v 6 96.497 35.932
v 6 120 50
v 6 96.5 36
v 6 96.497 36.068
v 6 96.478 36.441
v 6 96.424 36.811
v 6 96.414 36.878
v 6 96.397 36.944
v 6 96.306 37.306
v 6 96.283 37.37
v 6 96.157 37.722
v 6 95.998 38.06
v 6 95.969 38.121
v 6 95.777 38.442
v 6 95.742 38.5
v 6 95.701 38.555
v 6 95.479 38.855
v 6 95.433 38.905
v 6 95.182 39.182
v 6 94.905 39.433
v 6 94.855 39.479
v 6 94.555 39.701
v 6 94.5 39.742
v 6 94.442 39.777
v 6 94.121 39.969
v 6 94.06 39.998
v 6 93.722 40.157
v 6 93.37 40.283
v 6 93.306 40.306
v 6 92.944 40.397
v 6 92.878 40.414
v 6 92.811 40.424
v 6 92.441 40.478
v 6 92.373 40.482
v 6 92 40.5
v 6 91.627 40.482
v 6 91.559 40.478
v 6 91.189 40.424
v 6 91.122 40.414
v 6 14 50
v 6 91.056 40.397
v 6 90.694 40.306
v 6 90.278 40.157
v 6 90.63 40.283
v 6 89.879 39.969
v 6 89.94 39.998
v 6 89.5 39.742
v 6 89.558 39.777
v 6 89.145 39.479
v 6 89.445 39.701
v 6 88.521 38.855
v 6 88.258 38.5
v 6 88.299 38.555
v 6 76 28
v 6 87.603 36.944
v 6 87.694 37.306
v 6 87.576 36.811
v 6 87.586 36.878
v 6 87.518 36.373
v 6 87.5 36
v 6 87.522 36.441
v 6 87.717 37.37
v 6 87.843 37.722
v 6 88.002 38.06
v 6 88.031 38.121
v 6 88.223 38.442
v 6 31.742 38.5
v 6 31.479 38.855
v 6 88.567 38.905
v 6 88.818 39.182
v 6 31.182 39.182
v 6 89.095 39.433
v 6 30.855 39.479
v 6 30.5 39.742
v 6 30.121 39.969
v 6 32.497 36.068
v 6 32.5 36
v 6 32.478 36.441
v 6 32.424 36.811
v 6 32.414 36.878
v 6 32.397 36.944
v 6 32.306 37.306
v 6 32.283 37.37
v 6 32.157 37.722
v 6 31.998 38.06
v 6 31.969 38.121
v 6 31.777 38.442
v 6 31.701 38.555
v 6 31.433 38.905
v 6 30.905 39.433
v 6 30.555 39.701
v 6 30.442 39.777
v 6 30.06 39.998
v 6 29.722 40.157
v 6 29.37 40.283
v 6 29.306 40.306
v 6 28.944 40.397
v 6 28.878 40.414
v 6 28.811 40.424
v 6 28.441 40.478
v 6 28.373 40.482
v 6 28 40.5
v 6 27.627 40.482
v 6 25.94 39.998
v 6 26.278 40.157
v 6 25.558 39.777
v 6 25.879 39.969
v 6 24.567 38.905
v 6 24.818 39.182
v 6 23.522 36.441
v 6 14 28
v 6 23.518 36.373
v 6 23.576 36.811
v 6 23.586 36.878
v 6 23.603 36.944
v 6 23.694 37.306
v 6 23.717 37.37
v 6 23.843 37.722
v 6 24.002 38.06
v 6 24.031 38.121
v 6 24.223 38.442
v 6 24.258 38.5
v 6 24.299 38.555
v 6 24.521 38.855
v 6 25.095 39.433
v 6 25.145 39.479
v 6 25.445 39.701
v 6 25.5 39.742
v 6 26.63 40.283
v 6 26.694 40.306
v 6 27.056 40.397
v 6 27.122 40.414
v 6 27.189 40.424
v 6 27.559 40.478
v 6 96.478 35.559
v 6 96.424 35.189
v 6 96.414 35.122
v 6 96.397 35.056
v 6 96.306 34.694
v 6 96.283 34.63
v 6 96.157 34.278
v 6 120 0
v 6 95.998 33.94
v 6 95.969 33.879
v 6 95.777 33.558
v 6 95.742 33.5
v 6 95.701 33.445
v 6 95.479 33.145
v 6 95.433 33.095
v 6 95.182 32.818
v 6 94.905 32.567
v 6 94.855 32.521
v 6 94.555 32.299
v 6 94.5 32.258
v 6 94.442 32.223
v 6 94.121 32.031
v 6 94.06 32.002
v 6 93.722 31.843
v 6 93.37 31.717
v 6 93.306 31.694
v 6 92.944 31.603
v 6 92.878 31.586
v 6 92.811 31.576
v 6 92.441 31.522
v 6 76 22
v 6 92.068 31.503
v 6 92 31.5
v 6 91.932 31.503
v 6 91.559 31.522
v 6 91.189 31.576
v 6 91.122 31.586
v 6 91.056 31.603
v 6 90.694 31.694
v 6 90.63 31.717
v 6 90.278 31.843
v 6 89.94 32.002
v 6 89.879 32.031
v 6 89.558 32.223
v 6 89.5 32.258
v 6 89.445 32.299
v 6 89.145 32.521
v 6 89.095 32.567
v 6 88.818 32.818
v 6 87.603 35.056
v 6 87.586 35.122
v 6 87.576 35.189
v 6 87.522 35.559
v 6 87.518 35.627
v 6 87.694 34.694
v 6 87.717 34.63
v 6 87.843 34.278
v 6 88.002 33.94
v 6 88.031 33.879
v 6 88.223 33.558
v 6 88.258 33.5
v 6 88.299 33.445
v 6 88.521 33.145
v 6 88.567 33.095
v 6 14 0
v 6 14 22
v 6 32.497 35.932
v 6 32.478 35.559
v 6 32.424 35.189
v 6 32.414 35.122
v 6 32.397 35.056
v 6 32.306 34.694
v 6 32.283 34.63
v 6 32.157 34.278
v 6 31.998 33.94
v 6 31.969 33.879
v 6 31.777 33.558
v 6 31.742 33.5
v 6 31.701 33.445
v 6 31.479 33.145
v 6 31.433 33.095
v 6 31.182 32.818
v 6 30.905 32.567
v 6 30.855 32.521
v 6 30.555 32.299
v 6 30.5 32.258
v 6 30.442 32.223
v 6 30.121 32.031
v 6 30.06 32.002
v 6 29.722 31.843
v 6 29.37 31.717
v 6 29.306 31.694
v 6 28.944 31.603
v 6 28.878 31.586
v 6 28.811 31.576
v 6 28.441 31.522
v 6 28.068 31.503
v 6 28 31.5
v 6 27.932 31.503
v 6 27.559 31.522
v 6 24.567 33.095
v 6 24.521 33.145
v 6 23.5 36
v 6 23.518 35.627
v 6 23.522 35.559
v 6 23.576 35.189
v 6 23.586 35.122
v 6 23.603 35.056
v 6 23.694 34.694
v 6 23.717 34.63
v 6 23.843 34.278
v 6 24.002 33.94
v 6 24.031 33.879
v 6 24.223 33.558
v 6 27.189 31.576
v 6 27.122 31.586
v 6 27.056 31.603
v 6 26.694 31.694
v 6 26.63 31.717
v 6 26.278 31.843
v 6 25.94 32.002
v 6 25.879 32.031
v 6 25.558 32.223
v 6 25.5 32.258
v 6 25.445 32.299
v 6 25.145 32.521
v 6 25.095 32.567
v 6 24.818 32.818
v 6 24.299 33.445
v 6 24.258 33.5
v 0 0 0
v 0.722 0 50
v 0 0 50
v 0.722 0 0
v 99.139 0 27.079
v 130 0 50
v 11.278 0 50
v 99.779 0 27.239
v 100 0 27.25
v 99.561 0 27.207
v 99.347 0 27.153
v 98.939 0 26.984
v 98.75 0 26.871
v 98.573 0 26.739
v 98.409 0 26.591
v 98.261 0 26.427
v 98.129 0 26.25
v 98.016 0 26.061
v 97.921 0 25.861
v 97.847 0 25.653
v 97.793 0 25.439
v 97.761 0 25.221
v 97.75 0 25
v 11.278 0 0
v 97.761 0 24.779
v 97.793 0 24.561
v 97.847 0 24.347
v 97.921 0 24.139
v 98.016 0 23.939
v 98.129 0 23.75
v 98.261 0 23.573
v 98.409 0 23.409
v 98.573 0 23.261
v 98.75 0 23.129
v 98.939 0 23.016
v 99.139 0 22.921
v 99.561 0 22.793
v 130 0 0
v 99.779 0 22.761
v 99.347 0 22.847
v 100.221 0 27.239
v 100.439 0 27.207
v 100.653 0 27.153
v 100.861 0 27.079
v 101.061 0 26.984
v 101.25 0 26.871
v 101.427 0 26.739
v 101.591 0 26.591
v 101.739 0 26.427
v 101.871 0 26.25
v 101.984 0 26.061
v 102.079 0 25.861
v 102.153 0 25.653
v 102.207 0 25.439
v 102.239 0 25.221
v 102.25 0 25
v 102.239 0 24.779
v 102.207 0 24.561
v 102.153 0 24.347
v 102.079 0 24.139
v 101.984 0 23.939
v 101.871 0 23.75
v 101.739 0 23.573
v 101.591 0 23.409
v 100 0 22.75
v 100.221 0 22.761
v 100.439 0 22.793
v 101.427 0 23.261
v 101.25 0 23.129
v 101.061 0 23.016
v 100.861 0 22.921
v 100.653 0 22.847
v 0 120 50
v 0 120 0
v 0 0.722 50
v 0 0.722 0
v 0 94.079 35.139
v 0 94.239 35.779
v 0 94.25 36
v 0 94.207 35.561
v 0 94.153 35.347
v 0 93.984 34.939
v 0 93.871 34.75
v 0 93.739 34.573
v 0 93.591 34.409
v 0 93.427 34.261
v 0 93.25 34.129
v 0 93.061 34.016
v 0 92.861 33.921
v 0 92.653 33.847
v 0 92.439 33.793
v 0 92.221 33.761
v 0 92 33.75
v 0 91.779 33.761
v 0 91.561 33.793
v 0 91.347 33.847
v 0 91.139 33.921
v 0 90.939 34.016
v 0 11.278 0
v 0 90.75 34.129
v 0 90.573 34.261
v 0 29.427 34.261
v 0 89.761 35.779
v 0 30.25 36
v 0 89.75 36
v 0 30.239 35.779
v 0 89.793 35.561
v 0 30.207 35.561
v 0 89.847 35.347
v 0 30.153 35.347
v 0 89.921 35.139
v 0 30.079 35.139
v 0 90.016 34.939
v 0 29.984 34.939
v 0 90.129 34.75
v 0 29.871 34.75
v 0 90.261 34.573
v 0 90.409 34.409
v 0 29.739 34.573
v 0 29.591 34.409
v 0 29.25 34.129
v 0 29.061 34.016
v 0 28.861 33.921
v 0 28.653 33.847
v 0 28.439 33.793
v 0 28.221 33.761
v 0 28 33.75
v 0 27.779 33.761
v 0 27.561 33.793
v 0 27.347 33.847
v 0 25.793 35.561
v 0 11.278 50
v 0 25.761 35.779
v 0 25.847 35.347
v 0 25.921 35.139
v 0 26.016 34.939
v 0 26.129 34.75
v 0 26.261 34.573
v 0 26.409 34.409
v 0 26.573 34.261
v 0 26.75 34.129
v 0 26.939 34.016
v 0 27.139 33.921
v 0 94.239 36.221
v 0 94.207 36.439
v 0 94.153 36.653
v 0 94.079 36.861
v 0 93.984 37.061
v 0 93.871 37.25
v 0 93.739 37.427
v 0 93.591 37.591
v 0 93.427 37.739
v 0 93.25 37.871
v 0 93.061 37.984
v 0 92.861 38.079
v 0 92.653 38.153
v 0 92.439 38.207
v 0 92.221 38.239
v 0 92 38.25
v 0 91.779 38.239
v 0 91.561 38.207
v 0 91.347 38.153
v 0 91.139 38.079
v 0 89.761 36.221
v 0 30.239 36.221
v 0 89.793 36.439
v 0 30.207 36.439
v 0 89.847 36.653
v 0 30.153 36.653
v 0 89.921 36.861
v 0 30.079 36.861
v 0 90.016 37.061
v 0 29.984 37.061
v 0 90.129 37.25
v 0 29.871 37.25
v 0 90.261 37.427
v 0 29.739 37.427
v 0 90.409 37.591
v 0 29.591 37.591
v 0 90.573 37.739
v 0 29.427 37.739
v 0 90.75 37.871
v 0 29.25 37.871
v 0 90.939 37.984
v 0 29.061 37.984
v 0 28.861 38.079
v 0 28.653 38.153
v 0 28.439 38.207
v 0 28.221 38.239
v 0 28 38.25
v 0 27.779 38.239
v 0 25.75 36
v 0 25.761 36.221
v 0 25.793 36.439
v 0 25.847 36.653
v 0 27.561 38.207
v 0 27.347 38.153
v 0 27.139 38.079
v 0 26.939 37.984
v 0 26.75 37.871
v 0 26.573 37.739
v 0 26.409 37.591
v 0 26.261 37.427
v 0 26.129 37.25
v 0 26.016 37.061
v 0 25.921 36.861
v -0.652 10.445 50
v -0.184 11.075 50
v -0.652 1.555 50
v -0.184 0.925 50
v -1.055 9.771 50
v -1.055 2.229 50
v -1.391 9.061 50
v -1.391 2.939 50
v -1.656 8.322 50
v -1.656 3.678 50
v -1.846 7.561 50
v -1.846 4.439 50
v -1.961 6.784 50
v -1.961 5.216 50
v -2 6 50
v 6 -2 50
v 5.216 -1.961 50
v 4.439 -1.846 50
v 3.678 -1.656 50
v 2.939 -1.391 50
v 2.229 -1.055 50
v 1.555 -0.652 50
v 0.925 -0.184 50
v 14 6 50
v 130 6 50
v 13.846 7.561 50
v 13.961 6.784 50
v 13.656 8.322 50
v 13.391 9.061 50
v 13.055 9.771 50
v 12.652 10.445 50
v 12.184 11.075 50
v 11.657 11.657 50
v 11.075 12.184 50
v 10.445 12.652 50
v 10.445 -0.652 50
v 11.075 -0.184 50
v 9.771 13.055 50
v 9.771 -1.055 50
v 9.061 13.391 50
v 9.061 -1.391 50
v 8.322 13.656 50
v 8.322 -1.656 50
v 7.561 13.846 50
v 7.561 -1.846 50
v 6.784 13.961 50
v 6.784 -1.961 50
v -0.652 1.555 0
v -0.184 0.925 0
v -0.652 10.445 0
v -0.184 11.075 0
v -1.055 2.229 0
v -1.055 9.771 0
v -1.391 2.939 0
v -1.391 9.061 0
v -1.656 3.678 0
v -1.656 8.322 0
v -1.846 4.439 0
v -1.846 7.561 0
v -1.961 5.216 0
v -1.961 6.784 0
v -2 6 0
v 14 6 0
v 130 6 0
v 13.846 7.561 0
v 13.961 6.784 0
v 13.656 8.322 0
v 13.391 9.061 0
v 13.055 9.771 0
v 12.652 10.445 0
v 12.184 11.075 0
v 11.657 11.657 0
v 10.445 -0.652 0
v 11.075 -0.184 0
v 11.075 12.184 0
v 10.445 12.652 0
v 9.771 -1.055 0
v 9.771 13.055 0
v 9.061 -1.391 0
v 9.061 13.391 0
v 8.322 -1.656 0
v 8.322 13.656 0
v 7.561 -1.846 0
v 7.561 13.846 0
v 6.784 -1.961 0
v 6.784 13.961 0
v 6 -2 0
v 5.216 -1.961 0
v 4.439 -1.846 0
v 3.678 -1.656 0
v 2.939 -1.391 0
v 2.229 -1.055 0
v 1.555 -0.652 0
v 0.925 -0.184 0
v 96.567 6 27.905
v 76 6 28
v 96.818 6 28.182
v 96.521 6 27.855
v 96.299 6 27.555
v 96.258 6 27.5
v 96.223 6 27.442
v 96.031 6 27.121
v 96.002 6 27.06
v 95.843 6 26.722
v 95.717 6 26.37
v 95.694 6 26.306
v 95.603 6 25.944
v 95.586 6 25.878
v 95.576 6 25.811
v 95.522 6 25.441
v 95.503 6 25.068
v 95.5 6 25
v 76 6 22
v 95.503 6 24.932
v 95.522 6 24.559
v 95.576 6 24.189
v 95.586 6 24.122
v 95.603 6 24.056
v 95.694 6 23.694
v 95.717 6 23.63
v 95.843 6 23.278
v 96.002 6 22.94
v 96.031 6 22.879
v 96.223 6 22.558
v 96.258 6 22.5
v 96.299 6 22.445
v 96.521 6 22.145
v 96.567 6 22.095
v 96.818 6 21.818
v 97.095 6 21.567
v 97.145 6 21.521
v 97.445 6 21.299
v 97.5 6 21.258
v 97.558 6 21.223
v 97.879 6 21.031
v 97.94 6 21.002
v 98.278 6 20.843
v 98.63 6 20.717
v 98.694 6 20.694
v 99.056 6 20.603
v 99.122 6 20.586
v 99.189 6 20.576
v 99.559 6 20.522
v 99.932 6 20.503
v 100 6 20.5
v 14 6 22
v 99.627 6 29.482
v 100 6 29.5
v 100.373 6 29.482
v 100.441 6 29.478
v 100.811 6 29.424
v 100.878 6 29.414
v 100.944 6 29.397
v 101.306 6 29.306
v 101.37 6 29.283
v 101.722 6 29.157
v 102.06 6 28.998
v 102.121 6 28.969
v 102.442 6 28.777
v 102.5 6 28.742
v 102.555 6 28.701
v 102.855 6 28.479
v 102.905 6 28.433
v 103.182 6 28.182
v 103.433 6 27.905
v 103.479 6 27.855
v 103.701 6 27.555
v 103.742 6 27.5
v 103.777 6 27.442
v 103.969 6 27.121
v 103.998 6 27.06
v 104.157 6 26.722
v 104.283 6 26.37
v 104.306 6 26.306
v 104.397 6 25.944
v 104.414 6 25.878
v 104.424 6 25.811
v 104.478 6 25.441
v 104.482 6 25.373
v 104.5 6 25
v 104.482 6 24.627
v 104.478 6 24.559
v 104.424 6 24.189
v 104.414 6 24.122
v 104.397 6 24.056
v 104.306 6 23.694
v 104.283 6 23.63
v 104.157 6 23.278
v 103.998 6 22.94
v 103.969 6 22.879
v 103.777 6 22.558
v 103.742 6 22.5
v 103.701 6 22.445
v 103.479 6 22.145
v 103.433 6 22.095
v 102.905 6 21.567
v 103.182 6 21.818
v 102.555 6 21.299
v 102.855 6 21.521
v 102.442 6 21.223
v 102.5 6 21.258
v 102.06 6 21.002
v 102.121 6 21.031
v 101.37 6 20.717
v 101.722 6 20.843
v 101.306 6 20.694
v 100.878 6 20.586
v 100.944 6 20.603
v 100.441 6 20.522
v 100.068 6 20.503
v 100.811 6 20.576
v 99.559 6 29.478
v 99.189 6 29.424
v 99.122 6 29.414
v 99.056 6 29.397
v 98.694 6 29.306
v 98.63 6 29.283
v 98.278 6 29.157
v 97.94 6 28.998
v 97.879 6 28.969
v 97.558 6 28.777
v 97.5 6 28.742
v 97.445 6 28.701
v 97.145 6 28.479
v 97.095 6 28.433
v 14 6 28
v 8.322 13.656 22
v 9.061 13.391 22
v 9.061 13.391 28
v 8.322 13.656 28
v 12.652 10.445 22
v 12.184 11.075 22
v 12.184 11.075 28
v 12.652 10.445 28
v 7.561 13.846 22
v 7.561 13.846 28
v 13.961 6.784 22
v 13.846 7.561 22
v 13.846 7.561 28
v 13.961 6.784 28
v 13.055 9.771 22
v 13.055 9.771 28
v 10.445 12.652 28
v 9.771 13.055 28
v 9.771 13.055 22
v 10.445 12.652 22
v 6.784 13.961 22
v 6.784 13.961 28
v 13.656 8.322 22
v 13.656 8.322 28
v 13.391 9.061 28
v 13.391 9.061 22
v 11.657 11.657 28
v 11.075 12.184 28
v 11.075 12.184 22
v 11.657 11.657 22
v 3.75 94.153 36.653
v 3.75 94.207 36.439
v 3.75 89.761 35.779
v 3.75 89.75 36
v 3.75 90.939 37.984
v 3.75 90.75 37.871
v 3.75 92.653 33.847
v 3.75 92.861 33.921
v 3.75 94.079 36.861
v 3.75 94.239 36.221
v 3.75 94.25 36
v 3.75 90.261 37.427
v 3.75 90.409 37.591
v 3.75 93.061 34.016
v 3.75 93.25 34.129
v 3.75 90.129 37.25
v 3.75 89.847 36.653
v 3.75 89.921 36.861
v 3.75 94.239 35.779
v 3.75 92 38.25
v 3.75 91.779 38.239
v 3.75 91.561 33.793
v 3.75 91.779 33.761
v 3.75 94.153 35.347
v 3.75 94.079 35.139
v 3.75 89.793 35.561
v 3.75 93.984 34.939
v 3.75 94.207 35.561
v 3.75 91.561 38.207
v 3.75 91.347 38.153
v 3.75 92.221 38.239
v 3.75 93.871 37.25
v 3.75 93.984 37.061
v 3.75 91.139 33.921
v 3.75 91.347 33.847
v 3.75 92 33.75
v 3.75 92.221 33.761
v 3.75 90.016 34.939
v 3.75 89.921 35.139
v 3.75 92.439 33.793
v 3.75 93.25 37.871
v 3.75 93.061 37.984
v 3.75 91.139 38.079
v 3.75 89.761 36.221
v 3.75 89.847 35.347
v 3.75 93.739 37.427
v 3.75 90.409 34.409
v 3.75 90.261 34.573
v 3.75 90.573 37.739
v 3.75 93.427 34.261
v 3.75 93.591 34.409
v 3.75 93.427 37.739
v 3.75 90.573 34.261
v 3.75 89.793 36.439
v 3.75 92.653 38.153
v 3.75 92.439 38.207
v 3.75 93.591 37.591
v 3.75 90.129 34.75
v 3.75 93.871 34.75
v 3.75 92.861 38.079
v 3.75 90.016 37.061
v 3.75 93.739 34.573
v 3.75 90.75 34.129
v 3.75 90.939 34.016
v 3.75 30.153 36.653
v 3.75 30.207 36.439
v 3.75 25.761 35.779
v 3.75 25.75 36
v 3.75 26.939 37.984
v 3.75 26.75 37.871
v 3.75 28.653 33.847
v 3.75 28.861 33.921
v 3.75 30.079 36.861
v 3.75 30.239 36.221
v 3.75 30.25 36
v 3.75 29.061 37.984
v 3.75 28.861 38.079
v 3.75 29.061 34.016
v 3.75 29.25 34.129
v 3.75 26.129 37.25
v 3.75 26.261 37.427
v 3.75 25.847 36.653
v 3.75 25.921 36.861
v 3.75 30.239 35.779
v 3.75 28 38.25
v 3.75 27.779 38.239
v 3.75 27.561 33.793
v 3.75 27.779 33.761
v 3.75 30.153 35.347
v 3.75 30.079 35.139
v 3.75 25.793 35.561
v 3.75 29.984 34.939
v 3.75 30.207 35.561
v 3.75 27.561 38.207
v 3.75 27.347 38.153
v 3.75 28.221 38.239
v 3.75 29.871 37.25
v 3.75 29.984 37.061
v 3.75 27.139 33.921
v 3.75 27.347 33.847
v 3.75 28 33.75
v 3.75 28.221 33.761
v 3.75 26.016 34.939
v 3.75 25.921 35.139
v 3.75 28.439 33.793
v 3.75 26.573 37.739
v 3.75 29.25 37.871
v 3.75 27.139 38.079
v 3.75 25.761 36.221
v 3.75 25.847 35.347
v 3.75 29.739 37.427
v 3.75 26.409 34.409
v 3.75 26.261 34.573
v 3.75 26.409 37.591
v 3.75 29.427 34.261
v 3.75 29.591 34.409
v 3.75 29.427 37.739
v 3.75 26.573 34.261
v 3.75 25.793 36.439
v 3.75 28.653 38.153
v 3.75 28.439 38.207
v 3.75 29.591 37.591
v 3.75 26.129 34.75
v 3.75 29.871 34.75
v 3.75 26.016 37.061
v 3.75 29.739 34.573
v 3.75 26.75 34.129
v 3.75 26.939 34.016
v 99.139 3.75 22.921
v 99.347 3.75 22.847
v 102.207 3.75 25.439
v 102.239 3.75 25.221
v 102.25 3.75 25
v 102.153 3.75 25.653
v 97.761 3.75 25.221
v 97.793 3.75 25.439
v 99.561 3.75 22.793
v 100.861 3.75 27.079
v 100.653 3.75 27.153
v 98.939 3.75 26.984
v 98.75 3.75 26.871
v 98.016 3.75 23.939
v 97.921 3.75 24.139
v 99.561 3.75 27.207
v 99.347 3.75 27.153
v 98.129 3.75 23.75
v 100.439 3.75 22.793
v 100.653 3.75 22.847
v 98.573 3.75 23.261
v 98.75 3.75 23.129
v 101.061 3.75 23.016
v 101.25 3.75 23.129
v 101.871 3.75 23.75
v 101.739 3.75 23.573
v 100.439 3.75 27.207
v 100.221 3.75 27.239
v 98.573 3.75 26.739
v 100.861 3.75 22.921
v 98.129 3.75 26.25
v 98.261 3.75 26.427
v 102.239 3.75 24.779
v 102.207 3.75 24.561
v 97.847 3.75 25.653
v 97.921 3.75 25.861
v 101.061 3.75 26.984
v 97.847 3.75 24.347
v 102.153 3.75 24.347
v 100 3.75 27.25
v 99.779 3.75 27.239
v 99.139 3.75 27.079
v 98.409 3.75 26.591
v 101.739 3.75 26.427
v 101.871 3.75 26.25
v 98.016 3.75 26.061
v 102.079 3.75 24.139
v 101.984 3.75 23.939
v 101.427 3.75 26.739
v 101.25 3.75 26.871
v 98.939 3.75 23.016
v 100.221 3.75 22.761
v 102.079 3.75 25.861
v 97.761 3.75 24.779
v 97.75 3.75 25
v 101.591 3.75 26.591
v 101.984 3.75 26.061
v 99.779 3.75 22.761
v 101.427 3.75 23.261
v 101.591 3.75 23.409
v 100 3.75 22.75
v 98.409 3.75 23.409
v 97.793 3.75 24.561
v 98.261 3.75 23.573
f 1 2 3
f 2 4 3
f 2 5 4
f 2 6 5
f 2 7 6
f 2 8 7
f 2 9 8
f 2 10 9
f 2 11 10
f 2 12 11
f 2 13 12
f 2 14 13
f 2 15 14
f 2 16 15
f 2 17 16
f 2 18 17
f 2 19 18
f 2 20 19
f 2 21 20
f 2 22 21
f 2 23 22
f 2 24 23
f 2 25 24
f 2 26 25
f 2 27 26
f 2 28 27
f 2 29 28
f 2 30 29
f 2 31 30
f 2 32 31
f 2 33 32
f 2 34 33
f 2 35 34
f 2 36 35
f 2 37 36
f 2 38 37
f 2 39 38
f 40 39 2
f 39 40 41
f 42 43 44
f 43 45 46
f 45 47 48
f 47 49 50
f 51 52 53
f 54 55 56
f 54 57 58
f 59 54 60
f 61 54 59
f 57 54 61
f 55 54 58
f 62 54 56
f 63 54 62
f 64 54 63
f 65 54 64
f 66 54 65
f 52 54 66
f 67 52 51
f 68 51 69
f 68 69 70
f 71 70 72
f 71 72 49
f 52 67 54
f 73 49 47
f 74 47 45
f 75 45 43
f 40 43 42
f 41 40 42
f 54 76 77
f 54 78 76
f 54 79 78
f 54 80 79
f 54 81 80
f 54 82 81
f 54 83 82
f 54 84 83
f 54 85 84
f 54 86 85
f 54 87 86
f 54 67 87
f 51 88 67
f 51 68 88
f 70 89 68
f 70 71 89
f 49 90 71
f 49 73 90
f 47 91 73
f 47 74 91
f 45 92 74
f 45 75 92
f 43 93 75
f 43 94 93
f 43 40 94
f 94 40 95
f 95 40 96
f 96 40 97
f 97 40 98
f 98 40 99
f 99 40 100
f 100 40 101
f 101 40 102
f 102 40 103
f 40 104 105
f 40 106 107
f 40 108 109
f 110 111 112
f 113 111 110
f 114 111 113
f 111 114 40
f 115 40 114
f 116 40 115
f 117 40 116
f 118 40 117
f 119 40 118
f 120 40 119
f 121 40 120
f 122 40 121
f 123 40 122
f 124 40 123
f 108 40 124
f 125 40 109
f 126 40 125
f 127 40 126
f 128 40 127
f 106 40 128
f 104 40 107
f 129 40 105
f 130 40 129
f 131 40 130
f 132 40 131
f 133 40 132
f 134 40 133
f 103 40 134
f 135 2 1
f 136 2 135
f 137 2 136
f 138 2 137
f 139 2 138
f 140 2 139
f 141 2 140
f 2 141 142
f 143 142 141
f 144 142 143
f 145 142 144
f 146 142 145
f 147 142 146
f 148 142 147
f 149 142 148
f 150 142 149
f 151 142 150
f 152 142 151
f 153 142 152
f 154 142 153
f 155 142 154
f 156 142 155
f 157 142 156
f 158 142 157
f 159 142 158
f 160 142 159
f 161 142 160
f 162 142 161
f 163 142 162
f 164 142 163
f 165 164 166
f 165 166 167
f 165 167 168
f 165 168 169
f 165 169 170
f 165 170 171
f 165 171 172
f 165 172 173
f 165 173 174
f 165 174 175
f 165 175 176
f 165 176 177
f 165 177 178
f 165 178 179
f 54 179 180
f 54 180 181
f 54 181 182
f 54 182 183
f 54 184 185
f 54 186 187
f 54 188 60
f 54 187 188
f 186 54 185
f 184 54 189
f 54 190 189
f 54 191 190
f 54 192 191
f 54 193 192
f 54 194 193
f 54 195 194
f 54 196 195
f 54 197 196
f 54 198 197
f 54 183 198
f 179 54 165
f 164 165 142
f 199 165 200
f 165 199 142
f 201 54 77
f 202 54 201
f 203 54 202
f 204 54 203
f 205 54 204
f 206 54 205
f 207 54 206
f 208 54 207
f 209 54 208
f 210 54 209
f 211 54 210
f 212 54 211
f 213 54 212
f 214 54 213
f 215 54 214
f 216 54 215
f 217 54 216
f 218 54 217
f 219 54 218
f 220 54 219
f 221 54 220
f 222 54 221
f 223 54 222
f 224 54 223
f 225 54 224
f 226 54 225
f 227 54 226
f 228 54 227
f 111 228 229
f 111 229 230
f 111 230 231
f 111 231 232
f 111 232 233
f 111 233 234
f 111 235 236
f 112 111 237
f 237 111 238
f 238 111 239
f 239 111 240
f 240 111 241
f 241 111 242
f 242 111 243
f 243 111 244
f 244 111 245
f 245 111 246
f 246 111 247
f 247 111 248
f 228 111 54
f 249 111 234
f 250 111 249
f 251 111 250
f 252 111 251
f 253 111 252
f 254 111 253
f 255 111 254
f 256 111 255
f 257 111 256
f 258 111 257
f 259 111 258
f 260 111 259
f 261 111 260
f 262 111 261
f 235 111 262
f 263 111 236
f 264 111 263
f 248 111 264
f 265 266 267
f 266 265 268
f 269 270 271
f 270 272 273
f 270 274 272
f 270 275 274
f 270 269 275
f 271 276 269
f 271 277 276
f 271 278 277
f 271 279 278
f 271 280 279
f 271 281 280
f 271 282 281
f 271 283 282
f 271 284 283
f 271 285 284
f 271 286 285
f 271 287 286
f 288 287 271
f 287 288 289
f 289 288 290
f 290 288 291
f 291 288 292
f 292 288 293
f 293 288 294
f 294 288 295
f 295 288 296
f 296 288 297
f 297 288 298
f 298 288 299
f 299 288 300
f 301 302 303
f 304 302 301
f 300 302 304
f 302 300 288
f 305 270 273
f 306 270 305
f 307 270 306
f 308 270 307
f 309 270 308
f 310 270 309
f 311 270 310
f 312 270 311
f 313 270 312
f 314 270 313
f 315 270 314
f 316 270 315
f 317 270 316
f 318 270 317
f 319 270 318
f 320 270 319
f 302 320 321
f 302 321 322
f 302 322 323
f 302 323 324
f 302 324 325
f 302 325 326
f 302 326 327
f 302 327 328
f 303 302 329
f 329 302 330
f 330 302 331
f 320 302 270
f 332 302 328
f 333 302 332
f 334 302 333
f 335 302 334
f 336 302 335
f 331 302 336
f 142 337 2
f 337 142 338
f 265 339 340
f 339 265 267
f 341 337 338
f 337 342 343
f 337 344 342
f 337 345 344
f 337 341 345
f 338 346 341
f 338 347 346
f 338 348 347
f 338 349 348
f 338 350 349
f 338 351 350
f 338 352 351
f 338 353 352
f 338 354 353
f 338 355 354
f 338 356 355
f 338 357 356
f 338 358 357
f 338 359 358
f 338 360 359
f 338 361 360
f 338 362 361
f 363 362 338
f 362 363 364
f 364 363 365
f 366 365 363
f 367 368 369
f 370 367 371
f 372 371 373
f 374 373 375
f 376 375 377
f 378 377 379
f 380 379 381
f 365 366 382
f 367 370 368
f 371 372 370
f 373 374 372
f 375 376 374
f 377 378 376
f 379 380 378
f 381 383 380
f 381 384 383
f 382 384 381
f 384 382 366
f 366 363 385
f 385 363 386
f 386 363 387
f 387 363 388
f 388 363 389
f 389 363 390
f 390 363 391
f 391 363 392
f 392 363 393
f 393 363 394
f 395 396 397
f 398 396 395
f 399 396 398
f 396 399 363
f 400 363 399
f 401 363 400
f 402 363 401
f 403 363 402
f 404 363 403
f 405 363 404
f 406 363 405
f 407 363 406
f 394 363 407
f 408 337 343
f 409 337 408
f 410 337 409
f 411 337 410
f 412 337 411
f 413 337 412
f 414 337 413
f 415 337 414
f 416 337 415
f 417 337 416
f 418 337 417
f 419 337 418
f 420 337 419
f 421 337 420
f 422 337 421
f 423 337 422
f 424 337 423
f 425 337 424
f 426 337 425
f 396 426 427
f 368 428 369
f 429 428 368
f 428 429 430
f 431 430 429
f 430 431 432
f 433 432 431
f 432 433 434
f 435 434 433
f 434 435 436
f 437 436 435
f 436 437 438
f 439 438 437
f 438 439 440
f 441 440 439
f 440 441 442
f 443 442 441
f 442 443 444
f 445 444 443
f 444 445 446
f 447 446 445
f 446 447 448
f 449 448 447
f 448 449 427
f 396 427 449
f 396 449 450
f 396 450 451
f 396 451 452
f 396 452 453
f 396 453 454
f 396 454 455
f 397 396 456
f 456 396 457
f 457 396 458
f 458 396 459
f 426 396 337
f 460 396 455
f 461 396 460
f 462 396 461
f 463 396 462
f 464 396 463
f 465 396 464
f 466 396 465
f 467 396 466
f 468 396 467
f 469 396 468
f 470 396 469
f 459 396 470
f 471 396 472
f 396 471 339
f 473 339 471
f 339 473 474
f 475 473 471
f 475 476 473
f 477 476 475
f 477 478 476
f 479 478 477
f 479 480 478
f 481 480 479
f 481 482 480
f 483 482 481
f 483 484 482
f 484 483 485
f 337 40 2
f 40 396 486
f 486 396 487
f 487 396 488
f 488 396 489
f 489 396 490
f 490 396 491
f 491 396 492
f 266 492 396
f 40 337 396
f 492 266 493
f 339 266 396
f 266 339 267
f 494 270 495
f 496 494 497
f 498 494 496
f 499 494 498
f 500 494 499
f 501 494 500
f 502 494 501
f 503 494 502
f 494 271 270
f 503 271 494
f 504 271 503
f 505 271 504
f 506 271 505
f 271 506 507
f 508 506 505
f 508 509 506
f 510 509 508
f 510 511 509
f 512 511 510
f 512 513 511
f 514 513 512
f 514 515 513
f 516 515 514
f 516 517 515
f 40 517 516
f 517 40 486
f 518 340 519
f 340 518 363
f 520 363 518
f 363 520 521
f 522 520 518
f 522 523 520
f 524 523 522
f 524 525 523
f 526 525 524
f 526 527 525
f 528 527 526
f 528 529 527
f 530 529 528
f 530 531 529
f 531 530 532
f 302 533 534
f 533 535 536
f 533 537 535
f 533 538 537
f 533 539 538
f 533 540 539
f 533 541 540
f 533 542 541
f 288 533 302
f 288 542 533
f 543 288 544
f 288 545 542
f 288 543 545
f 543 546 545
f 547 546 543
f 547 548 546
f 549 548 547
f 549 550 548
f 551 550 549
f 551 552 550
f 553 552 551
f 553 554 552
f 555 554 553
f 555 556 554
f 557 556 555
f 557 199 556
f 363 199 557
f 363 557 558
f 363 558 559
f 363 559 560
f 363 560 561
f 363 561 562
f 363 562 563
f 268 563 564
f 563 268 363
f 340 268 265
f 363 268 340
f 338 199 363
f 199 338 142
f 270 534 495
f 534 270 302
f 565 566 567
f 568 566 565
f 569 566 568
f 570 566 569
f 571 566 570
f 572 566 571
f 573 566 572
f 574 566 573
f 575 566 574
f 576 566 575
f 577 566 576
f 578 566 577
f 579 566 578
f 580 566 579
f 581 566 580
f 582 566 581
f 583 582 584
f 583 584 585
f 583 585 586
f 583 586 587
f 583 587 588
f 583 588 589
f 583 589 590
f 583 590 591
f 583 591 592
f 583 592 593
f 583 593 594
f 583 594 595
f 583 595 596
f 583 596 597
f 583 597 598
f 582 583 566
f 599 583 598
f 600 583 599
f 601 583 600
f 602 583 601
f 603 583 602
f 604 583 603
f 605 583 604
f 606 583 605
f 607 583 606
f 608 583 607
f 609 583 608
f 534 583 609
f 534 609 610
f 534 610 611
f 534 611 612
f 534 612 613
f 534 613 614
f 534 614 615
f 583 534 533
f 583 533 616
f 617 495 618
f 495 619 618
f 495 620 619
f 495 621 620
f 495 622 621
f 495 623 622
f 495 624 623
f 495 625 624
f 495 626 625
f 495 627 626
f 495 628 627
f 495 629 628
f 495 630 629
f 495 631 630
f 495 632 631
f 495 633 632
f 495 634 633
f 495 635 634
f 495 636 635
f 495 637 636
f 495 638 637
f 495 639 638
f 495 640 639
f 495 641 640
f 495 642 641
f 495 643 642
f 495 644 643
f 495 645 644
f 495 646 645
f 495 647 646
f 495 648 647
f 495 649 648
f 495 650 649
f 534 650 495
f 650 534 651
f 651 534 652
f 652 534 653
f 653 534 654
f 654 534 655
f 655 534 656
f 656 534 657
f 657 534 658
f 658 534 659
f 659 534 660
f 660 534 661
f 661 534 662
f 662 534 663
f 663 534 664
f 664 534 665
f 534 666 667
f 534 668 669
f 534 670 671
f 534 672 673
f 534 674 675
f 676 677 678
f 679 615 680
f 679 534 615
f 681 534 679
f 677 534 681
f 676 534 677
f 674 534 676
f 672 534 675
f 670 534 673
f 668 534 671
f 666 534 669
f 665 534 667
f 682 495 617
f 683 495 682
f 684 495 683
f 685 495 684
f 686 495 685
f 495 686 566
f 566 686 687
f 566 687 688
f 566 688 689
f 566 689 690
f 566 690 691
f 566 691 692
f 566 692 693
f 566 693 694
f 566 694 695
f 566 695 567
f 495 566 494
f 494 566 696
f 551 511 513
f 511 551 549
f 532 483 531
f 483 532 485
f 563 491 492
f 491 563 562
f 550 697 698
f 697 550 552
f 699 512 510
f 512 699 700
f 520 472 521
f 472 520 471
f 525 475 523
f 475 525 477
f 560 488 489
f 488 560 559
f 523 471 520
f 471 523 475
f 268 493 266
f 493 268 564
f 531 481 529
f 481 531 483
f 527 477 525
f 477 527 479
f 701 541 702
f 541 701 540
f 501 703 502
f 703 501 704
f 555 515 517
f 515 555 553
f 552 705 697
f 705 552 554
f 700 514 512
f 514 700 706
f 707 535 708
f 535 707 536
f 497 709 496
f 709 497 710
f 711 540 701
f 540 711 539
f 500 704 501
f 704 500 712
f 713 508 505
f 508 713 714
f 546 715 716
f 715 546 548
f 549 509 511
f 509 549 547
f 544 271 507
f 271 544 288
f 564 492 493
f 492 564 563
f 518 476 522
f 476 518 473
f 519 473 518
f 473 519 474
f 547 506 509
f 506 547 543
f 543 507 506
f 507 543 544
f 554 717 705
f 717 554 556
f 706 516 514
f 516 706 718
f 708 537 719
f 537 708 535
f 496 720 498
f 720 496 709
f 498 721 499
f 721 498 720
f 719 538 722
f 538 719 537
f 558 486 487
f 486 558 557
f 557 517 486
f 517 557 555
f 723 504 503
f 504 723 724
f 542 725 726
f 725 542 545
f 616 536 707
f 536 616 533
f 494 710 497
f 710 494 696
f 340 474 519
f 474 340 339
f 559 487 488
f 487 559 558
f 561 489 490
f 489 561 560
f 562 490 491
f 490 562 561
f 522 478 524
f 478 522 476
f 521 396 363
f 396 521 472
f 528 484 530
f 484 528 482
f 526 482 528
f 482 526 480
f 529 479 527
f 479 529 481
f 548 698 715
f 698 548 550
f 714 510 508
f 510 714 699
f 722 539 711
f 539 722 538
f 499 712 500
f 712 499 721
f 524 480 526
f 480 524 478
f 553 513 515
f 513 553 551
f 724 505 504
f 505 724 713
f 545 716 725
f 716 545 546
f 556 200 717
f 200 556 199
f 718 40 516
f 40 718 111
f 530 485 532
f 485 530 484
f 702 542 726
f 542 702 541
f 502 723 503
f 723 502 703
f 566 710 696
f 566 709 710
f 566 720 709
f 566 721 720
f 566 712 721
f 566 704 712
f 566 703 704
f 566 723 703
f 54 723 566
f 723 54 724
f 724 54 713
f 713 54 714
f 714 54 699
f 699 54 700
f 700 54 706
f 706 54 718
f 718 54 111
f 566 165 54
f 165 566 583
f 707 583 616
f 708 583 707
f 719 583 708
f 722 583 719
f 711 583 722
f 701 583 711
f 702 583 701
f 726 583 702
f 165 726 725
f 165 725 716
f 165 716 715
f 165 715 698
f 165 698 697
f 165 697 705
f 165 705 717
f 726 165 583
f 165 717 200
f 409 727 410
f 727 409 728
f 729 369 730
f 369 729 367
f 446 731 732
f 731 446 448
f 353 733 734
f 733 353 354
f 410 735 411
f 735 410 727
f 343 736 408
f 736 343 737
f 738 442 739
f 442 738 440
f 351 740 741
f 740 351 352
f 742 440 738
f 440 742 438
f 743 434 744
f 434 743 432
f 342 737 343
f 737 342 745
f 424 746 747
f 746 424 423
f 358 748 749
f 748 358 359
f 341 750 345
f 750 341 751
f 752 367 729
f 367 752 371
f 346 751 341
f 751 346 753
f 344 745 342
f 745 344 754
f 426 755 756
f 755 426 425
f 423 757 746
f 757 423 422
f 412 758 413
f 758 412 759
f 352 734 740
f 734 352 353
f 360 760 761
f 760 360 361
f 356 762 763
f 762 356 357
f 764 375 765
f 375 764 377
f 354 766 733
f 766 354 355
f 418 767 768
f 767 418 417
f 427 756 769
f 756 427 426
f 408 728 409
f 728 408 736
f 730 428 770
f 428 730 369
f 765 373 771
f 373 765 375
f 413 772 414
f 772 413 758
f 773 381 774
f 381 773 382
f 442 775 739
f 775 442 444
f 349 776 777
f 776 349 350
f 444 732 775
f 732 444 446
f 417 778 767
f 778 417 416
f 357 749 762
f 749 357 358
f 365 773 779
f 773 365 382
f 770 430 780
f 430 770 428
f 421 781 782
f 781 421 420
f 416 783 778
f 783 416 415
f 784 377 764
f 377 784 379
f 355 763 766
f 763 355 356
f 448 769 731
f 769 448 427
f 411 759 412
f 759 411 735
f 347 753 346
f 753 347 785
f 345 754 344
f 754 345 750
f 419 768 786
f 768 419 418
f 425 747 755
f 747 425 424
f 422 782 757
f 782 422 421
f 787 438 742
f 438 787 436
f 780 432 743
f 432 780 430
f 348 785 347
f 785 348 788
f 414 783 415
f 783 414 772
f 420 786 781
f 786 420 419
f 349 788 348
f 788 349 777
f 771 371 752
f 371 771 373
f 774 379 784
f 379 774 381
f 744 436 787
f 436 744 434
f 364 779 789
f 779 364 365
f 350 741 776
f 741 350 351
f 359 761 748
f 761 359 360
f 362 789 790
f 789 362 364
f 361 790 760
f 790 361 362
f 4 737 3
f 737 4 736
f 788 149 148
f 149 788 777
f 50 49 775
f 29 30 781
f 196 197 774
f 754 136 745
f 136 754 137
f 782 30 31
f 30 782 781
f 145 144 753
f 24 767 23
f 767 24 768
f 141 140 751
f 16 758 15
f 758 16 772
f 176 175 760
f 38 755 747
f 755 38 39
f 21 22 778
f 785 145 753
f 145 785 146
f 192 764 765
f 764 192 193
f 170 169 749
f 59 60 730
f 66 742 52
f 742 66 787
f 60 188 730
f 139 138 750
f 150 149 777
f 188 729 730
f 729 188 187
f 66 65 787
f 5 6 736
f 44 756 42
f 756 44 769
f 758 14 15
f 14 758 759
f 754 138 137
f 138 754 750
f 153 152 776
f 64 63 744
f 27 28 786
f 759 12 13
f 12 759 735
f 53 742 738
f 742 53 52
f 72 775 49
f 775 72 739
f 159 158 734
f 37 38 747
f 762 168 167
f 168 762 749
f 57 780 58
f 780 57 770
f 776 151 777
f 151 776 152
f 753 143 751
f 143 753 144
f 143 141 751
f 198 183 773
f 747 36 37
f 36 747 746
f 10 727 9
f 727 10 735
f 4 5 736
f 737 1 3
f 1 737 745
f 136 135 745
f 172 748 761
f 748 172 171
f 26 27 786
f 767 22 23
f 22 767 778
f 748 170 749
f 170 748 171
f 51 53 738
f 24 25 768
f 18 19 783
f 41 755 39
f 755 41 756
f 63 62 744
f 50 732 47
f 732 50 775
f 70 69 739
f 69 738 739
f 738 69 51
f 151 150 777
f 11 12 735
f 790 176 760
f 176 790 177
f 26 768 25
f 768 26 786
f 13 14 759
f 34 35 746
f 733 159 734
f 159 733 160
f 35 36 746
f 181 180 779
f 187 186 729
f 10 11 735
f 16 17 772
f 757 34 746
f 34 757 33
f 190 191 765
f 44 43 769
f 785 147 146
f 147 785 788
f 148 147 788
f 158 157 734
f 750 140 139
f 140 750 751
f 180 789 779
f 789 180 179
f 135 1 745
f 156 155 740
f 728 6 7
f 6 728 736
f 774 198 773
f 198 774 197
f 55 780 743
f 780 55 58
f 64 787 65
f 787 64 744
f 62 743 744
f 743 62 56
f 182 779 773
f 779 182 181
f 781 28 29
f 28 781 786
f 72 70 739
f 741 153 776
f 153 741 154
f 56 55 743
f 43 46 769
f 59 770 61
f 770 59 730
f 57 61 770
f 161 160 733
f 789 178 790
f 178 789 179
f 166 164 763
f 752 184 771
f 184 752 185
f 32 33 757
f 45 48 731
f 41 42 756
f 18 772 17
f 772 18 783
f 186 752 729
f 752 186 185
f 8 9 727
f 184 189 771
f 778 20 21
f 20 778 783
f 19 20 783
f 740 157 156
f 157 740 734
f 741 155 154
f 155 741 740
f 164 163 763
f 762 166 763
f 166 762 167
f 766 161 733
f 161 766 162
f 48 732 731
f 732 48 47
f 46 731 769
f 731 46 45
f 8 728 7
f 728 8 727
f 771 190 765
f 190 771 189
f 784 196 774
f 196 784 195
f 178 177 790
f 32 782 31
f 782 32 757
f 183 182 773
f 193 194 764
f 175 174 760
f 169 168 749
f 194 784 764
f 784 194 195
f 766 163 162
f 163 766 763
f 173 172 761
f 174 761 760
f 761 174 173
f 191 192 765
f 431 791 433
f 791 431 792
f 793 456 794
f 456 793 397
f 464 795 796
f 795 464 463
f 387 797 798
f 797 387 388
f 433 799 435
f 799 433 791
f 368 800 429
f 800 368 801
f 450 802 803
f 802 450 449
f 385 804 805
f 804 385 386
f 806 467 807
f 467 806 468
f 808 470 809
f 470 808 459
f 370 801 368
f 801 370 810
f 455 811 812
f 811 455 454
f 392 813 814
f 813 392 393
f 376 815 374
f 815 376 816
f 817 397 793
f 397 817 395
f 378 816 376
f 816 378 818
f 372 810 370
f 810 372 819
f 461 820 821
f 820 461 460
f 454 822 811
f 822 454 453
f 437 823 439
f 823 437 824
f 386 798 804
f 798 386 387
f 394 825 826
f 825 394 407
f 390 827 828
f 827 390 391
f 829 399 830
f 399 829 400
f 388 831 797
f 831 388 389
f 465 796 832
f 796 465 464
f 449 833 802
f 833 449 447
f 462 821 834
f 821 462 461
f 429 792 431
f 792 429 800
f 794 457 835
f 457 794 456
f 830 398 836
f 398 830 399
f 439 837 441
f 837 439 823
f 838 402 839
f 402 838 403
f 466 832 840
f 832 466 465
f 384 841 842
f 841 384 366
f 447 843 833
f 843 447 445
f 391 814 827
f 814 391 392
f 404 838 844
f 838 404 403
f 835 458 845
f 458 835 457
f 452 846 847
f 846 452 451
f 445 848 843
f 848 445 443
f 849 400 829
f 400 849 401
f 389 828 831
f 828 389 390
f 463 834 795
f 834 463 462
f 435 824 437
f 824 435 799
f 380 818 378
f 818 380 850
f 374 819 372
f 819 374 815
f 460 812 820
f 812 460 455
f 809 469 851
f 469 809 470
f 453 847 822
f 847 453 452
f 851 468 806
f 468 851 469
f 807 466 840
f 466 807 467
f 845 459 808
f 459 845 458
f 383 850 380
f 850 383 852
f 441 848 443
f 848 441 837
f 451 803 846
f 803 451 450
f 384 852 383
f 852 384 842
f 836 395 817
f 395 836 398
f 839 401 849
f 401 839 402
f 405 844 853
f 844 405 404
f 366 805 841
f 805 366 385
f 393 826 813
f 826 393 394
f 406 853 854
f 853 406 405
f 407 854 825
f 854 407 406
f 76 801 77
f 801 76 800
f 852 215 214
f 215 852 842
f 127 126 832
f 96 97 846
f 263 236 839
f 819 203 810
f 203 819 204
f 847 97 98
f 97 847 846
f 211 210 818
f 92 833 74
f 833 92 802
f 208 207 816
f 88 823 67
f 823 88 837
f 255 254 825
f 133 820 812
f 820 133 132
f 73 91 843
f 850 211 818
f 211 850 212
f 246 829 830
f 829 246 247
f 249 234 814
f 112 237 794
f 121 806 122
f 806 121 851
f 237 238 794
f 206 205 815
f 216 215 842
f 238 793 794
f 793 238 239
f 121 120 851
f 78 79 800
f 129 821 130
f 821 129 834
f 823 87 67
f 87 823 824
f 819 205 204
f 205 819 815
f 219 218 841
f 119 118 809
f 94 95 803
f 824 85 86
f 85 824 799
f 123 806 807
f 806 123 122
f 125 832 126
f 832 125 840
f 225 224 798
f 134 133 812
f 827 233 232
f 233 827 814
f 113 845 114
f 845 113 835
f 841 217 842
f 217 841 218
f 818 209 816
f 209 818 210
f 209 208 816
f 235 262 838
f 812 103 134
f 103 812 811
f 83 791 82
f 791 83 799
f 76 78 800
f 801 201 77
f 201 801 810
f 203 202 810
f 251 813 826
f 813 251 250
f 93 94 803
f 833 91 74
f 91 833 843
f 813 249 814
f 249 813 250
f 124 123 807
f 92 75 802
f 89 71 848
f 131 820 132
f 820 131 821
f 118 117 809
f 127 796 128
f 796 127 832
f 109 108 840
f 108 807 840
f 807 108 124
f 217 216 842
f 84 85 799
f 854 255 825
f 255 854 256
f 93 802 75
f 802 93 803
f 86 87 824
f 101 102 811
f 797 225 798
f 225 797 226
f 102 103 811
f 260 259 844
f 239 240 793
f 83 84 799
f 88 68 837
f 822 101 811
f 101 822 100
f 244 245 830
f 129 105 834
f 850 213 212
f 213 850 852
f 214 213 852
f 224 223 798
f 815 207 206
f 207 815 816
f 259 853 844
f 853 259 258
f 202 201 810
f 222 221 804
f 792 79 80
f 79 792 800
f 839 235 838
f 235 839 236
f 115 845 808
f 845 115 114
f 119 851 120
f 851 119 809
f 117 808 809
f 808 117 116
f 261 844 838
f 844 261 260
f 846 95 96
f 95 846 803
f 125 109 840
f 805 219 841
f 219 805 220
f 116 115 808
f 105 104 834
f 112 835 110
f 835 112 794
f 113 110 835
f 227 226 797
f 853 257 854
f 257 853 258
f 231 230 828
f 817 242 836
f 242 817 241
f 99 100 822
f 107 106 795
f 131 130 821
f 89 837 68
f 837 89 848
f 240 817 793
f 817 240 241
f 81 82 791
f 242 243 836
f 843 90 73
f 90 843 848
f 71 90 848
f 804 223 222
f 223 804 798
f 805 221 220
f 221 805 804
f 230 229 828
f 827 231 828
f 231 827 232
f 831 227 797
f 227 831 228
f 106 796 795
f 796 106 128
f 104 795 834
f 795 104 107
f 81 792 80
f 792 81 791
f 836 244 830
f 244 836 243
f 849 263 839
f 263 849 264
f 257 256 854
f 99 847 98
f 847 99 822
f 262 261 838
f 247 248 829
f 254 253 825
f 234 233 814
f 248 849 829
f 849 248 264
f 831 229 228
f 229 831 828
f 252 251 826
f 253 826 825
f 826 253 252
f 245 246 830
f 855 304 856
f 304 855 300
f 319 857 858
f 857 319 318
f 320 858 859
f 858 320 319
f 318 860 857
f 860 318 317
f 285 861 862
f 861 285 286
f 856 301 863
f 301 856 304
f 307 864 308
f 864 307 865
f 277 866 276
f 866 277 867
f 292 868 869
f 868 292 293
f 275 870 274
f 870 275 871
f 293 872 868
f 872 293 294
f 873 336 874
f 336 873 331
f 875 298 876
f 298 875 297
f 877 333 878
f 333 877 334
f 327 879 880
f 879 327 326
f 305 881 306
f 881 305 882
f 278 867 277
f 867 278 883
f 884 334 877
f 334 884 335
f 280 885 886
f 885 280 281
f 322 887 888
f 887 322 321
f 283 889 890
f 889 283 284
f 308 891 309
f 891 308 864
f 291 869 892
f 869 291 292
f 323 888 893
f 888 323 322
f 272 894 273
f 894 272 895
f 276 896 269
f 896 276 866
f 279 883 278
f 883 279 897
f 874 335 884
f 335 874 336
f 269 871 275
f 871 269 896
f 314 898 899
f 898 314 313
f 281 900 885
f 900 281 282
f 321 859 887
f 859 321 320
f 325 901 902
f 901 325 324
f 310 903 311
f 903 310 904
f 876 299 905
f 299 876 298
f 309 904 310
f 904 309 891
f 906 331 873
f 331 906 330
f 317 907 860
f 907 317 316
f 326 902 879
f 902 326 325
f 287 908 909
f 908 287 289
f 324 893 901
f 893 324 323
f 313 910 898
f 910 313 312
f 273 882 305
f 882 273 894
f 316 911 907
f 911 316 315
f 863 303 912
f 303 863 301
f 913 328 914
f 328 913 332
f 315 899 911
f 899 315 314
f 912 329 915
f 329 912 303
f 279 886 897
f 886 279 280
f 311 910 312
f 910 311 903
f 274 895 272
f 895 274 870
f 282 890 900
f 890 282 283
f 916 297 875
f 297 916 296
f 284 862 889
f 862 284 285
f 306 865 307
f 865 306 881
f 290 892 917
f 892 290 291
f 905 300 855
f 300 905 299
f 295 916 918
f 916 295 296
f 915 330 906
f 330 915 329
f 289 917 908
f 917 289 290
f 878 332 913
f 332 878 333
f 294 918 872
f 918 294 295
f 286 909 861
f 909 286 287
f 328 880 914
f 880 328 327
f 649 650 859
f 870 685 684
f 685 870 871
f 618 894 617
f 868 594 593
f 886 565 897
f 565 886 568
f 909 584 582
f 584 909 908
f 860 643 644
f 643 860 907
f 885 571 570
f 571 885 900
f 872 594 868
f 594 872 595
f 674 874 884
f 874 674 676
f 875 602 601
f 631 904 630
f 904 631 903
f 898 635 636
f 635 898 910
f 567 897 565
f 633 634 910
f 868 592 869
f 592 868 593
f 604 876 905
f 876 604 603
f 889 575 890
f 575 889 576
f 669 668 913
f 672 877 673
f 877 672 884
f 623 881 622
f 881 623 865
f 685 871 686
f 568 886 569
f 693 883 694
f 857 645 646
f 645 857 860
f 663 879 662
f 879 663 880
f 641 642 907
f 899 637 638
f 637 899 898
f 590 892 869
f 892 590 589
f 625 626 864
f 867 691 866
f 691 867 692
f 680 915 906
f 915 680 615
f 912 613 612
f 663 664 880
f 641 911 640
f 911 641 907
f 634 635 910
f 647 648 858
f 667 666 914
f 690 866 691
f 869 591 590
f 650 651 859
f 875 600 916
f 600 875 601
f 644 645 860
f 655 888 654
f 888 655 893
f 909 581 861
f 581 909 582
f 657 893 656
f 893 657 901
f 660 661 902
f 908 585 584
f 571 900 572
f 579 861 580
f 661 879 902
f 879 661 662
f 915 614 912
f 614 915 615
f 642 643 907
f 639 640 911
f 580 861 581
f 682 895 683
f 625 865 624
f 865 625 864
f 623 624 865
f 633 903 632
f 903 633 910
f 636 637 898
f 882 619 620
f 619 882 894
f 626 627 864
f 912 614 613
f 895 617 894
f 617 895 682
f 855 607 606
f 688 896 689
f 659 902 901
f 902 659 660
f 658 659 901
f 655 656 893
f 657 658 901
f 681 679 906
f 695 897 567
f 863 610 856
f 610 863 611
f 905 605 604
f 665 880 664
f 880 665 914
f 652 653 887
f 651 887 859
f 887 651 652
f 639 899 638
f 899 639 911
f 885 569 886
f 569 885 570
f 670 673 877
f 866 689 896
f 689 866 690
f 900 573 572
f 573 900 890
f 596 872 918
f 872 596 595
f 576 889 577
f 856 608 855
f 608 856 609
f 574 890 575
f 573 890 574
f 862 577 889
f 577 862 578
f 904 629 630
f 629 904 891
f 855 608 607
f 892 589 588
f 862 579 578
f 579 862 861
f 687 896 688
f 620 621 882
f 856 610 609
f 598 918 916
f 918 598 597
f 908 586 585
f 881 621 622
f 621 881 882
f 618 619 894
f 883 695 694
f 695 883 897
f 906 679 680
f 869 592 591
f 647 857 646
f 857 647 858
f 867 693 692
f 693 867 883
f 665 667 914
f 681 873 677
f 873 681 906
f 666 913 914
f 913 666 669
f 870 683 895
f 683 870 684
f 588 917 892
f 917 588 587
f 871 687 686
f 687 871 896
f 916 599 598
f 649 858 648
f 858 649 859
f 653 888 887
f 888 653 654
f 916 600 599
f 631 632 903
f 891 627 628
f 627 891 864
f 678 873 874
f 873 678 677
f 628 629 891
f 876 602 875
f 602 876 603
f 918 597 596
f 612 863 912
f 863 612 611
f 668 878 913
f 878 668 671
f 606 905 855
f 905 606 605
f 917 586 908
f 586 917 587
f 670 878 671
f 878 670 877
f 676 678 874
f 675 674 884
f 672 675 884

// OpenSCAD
// ============================================================================
// L SHELF BRACKET FOR FDM PRINTING - PETG - NO SUPPORTS
// Units: millimetres (mm)
// Design load: 3 kg spread over a shelf 150 mm deep.
// Recommended print: PETG, 0.4 mm nozzle, 0.20 mm layers,
// 5 perimeters, 40-50 % gyroid infill and a 5 mm skirt/brim.
// A model-written bracket whose inner fillet sticks out 2 mm behind the wall
// face: the defect the spec check and the cut views must catch.
// ============================================================================

/* [Overall size] */
shelf_depth                = 150;  // Depth of the shelf it carries
front_margin               = 20;   // From the bracket's front to the shelf's edge
shelf_flange_length        = shelf_depth - front_margin; // 130 mm
wall_flange_height         = 120;  // Height of the flange screwed to the wall
bracket_width              = 50;   // Width of both flanges
flange_thickness           = 6;    // Thickness of both flanges

/* [Rib] */
rib_thickness              = 6;    // Thickness of the central gusset
rib_leg                    = 70;   // Length of each leg from the inner corner
inner_fillet_radius        = 8;    // Inner corner radius: lowers stress concentration

/* [4 mm screws] */
screw_diameter             = 4;
diametral_clearance        = 0.5;
hole_diameter              = screw_diameter + diametral_clearance; // 4.5 mm
countersink_head_diameter  = 9;    // Largest diameter of the flat head
// 90 degree countersink: a 45 degree slope, printable without supports.
countersink_depth          = (countersink_head_diameter - hole_diameter) / 2; // 2.25 mm
drill_overcut              = 1;    // Overcut of the cutting tools

/* [Screw positions] */
// The wall screws are offset in Y to stay clear of the central rib.
wall_screws_y              = 36;
lower_wall_screw_z         = 28;
upper_wall_screw_z         = 92;
// The shelf screw is centered in Y, in front of the rib's end.
shelf_screw_x              = 100;
shelf_screw_y              = bracket_width / 2;

$fn = 64;

// Basic interference and margin checks.
assert(shelf_screw_x > flange_thickness + rib_leg + countersink_head_diameter);
assert(upper_wall_screw_z < wall_flange_height - flange_thickness);

// ----------------------------------------------------------------------------
// Vertical flange against the wall: X = thickness, Y = width, Z = height.
// The back face (X=0) rests against the wall.
// ----------------------------------------------------------------------------
module wall_flange() {
    cube([flange_thickness, bracket_width, wall_flange_height]);
}

// ----------------------------------------------------------------------------
// Horizontal flange under the shelf. Its top face is at Z=wall_flange_height.
// ----------------------------------------------------------------------------
module shelf_flange() {
    translate([0, 0, wall_flange_height - flange_thickness])
        cube([shelf_flange_length, bracket_width, flange_thickness]);
}

// ----------------------------------------------------------------------------
// Inner fillet: a cylinder sitting in the corner; it only adds material in
// the inner quadrant, reinforcing the zone that bends the most.
// ----------------------------------------------------------------------------
module inner_fillet() {
    translate([flange_thickness, bracket_width, wall_flange_height - flange_thickness])
        rotate([90, 0, 0])
            cylinder(r = inner_fillet_radius, h = bracket_width);
}

// ----------------------------------------------------------------------------
// Triangular gusset centered in the width, between the front face of the wall
// flange and the bottom face of the shelf flange. Hypotenuse at 45 degrees.
// ----------------------------------------------------------------------------
module rib() {
    translate([flange_thickness,
               bracket_width / 2 + rib_thickness / 2,
               wall_flange_height - flange_thickness])
        rotate([90, 0, 0])
            linear_extrude(height = rib_thickness)
                polygon(points = [[0, 0], [0, -rib_leg], [rib_leg, 0]]);
}

// Solid body without holes.
module body() {
    union() {
        wall_flange();
        shelf_flange();
        inner_fillet();
        rib();
    }
}

// ----------------------------------------------------------------------------
// Countersunk hole along X for the wall flange.
// The screw head goes in from the front face (X=flange_thickness).
// ----------------------------------------------------------------------------
module wall_countersunk_hole(pos_y, pos_z) {
    cone_length = countersink_depth + drill_overcut;

    // Screw clearance.
    translate([-drill_overcut, pos_y, pos_z])
        rotate([0, 90, 0])
            cylinder(d = hole_diameter, h = flange_thickness + 2 * drill_overcut);

    // 90 degree countersink cone.
    translate([flange_thickness - countersink_depth, pos_y, pos_z])
        rotate([0, 90, 0])
            cylinder(h = cone_length,
                     r1 = hole_diameter / 2,
                     r2 = hole_diameter / 2 + cone_length);
}

// ----------------------------------------------------------------------------
// Countersunk hole along Z for the shelf flange.
// The head sits on the bottom face and the screw goes into the shelf.
// ----------------------------------------------------------------------------
module shelf_countersunk_hole(pos_x, pos_y) {
    bottom_z = wall_flange_height - flange_thickness;
    cone_length = countersink_depth + drill_overcut;

    // Screw clearance.
    translate([pos_x, pos_y, bottom_z - drill_overcut])
        cylinder(d = hole_diameter, h = flange_thickness + 2 * drill_overcut);

    // 90 degree countersink cone.
    translate([pos_x, pos_y, bottom_z - drill_overcut])
        cylinder(h = cone_length,
                 r1 = hole_diameter / 2 + cone_length,
                 r2 = hole_diameter / 2);
}

// The part in its position of use, before it is oriented for printing.
module bracket() {
    difference() {
        body();

        wall_countersunk_hole(wall_screws_y, lower_wall_screw_z);
        wall_countersunk_hole(wall_screws_y, upper_wall_screw_z);
        shelf_countersunk_hole(shelf_screw_x, shelf_screw_y);
    }
}

// ----------------------------------------------------------------------------
// PRINT ORIENTATION: one whole side face rests on the bed (Z=0), the L profile
// is printed in layers parallel to its bending plane and the print height is
// only the bracket's width (50 mm).
// ----------------------------------------------------------------------------
translate([0, wall_flange_height, 0])
    rotate([90, 0, 0])
        bracket();
